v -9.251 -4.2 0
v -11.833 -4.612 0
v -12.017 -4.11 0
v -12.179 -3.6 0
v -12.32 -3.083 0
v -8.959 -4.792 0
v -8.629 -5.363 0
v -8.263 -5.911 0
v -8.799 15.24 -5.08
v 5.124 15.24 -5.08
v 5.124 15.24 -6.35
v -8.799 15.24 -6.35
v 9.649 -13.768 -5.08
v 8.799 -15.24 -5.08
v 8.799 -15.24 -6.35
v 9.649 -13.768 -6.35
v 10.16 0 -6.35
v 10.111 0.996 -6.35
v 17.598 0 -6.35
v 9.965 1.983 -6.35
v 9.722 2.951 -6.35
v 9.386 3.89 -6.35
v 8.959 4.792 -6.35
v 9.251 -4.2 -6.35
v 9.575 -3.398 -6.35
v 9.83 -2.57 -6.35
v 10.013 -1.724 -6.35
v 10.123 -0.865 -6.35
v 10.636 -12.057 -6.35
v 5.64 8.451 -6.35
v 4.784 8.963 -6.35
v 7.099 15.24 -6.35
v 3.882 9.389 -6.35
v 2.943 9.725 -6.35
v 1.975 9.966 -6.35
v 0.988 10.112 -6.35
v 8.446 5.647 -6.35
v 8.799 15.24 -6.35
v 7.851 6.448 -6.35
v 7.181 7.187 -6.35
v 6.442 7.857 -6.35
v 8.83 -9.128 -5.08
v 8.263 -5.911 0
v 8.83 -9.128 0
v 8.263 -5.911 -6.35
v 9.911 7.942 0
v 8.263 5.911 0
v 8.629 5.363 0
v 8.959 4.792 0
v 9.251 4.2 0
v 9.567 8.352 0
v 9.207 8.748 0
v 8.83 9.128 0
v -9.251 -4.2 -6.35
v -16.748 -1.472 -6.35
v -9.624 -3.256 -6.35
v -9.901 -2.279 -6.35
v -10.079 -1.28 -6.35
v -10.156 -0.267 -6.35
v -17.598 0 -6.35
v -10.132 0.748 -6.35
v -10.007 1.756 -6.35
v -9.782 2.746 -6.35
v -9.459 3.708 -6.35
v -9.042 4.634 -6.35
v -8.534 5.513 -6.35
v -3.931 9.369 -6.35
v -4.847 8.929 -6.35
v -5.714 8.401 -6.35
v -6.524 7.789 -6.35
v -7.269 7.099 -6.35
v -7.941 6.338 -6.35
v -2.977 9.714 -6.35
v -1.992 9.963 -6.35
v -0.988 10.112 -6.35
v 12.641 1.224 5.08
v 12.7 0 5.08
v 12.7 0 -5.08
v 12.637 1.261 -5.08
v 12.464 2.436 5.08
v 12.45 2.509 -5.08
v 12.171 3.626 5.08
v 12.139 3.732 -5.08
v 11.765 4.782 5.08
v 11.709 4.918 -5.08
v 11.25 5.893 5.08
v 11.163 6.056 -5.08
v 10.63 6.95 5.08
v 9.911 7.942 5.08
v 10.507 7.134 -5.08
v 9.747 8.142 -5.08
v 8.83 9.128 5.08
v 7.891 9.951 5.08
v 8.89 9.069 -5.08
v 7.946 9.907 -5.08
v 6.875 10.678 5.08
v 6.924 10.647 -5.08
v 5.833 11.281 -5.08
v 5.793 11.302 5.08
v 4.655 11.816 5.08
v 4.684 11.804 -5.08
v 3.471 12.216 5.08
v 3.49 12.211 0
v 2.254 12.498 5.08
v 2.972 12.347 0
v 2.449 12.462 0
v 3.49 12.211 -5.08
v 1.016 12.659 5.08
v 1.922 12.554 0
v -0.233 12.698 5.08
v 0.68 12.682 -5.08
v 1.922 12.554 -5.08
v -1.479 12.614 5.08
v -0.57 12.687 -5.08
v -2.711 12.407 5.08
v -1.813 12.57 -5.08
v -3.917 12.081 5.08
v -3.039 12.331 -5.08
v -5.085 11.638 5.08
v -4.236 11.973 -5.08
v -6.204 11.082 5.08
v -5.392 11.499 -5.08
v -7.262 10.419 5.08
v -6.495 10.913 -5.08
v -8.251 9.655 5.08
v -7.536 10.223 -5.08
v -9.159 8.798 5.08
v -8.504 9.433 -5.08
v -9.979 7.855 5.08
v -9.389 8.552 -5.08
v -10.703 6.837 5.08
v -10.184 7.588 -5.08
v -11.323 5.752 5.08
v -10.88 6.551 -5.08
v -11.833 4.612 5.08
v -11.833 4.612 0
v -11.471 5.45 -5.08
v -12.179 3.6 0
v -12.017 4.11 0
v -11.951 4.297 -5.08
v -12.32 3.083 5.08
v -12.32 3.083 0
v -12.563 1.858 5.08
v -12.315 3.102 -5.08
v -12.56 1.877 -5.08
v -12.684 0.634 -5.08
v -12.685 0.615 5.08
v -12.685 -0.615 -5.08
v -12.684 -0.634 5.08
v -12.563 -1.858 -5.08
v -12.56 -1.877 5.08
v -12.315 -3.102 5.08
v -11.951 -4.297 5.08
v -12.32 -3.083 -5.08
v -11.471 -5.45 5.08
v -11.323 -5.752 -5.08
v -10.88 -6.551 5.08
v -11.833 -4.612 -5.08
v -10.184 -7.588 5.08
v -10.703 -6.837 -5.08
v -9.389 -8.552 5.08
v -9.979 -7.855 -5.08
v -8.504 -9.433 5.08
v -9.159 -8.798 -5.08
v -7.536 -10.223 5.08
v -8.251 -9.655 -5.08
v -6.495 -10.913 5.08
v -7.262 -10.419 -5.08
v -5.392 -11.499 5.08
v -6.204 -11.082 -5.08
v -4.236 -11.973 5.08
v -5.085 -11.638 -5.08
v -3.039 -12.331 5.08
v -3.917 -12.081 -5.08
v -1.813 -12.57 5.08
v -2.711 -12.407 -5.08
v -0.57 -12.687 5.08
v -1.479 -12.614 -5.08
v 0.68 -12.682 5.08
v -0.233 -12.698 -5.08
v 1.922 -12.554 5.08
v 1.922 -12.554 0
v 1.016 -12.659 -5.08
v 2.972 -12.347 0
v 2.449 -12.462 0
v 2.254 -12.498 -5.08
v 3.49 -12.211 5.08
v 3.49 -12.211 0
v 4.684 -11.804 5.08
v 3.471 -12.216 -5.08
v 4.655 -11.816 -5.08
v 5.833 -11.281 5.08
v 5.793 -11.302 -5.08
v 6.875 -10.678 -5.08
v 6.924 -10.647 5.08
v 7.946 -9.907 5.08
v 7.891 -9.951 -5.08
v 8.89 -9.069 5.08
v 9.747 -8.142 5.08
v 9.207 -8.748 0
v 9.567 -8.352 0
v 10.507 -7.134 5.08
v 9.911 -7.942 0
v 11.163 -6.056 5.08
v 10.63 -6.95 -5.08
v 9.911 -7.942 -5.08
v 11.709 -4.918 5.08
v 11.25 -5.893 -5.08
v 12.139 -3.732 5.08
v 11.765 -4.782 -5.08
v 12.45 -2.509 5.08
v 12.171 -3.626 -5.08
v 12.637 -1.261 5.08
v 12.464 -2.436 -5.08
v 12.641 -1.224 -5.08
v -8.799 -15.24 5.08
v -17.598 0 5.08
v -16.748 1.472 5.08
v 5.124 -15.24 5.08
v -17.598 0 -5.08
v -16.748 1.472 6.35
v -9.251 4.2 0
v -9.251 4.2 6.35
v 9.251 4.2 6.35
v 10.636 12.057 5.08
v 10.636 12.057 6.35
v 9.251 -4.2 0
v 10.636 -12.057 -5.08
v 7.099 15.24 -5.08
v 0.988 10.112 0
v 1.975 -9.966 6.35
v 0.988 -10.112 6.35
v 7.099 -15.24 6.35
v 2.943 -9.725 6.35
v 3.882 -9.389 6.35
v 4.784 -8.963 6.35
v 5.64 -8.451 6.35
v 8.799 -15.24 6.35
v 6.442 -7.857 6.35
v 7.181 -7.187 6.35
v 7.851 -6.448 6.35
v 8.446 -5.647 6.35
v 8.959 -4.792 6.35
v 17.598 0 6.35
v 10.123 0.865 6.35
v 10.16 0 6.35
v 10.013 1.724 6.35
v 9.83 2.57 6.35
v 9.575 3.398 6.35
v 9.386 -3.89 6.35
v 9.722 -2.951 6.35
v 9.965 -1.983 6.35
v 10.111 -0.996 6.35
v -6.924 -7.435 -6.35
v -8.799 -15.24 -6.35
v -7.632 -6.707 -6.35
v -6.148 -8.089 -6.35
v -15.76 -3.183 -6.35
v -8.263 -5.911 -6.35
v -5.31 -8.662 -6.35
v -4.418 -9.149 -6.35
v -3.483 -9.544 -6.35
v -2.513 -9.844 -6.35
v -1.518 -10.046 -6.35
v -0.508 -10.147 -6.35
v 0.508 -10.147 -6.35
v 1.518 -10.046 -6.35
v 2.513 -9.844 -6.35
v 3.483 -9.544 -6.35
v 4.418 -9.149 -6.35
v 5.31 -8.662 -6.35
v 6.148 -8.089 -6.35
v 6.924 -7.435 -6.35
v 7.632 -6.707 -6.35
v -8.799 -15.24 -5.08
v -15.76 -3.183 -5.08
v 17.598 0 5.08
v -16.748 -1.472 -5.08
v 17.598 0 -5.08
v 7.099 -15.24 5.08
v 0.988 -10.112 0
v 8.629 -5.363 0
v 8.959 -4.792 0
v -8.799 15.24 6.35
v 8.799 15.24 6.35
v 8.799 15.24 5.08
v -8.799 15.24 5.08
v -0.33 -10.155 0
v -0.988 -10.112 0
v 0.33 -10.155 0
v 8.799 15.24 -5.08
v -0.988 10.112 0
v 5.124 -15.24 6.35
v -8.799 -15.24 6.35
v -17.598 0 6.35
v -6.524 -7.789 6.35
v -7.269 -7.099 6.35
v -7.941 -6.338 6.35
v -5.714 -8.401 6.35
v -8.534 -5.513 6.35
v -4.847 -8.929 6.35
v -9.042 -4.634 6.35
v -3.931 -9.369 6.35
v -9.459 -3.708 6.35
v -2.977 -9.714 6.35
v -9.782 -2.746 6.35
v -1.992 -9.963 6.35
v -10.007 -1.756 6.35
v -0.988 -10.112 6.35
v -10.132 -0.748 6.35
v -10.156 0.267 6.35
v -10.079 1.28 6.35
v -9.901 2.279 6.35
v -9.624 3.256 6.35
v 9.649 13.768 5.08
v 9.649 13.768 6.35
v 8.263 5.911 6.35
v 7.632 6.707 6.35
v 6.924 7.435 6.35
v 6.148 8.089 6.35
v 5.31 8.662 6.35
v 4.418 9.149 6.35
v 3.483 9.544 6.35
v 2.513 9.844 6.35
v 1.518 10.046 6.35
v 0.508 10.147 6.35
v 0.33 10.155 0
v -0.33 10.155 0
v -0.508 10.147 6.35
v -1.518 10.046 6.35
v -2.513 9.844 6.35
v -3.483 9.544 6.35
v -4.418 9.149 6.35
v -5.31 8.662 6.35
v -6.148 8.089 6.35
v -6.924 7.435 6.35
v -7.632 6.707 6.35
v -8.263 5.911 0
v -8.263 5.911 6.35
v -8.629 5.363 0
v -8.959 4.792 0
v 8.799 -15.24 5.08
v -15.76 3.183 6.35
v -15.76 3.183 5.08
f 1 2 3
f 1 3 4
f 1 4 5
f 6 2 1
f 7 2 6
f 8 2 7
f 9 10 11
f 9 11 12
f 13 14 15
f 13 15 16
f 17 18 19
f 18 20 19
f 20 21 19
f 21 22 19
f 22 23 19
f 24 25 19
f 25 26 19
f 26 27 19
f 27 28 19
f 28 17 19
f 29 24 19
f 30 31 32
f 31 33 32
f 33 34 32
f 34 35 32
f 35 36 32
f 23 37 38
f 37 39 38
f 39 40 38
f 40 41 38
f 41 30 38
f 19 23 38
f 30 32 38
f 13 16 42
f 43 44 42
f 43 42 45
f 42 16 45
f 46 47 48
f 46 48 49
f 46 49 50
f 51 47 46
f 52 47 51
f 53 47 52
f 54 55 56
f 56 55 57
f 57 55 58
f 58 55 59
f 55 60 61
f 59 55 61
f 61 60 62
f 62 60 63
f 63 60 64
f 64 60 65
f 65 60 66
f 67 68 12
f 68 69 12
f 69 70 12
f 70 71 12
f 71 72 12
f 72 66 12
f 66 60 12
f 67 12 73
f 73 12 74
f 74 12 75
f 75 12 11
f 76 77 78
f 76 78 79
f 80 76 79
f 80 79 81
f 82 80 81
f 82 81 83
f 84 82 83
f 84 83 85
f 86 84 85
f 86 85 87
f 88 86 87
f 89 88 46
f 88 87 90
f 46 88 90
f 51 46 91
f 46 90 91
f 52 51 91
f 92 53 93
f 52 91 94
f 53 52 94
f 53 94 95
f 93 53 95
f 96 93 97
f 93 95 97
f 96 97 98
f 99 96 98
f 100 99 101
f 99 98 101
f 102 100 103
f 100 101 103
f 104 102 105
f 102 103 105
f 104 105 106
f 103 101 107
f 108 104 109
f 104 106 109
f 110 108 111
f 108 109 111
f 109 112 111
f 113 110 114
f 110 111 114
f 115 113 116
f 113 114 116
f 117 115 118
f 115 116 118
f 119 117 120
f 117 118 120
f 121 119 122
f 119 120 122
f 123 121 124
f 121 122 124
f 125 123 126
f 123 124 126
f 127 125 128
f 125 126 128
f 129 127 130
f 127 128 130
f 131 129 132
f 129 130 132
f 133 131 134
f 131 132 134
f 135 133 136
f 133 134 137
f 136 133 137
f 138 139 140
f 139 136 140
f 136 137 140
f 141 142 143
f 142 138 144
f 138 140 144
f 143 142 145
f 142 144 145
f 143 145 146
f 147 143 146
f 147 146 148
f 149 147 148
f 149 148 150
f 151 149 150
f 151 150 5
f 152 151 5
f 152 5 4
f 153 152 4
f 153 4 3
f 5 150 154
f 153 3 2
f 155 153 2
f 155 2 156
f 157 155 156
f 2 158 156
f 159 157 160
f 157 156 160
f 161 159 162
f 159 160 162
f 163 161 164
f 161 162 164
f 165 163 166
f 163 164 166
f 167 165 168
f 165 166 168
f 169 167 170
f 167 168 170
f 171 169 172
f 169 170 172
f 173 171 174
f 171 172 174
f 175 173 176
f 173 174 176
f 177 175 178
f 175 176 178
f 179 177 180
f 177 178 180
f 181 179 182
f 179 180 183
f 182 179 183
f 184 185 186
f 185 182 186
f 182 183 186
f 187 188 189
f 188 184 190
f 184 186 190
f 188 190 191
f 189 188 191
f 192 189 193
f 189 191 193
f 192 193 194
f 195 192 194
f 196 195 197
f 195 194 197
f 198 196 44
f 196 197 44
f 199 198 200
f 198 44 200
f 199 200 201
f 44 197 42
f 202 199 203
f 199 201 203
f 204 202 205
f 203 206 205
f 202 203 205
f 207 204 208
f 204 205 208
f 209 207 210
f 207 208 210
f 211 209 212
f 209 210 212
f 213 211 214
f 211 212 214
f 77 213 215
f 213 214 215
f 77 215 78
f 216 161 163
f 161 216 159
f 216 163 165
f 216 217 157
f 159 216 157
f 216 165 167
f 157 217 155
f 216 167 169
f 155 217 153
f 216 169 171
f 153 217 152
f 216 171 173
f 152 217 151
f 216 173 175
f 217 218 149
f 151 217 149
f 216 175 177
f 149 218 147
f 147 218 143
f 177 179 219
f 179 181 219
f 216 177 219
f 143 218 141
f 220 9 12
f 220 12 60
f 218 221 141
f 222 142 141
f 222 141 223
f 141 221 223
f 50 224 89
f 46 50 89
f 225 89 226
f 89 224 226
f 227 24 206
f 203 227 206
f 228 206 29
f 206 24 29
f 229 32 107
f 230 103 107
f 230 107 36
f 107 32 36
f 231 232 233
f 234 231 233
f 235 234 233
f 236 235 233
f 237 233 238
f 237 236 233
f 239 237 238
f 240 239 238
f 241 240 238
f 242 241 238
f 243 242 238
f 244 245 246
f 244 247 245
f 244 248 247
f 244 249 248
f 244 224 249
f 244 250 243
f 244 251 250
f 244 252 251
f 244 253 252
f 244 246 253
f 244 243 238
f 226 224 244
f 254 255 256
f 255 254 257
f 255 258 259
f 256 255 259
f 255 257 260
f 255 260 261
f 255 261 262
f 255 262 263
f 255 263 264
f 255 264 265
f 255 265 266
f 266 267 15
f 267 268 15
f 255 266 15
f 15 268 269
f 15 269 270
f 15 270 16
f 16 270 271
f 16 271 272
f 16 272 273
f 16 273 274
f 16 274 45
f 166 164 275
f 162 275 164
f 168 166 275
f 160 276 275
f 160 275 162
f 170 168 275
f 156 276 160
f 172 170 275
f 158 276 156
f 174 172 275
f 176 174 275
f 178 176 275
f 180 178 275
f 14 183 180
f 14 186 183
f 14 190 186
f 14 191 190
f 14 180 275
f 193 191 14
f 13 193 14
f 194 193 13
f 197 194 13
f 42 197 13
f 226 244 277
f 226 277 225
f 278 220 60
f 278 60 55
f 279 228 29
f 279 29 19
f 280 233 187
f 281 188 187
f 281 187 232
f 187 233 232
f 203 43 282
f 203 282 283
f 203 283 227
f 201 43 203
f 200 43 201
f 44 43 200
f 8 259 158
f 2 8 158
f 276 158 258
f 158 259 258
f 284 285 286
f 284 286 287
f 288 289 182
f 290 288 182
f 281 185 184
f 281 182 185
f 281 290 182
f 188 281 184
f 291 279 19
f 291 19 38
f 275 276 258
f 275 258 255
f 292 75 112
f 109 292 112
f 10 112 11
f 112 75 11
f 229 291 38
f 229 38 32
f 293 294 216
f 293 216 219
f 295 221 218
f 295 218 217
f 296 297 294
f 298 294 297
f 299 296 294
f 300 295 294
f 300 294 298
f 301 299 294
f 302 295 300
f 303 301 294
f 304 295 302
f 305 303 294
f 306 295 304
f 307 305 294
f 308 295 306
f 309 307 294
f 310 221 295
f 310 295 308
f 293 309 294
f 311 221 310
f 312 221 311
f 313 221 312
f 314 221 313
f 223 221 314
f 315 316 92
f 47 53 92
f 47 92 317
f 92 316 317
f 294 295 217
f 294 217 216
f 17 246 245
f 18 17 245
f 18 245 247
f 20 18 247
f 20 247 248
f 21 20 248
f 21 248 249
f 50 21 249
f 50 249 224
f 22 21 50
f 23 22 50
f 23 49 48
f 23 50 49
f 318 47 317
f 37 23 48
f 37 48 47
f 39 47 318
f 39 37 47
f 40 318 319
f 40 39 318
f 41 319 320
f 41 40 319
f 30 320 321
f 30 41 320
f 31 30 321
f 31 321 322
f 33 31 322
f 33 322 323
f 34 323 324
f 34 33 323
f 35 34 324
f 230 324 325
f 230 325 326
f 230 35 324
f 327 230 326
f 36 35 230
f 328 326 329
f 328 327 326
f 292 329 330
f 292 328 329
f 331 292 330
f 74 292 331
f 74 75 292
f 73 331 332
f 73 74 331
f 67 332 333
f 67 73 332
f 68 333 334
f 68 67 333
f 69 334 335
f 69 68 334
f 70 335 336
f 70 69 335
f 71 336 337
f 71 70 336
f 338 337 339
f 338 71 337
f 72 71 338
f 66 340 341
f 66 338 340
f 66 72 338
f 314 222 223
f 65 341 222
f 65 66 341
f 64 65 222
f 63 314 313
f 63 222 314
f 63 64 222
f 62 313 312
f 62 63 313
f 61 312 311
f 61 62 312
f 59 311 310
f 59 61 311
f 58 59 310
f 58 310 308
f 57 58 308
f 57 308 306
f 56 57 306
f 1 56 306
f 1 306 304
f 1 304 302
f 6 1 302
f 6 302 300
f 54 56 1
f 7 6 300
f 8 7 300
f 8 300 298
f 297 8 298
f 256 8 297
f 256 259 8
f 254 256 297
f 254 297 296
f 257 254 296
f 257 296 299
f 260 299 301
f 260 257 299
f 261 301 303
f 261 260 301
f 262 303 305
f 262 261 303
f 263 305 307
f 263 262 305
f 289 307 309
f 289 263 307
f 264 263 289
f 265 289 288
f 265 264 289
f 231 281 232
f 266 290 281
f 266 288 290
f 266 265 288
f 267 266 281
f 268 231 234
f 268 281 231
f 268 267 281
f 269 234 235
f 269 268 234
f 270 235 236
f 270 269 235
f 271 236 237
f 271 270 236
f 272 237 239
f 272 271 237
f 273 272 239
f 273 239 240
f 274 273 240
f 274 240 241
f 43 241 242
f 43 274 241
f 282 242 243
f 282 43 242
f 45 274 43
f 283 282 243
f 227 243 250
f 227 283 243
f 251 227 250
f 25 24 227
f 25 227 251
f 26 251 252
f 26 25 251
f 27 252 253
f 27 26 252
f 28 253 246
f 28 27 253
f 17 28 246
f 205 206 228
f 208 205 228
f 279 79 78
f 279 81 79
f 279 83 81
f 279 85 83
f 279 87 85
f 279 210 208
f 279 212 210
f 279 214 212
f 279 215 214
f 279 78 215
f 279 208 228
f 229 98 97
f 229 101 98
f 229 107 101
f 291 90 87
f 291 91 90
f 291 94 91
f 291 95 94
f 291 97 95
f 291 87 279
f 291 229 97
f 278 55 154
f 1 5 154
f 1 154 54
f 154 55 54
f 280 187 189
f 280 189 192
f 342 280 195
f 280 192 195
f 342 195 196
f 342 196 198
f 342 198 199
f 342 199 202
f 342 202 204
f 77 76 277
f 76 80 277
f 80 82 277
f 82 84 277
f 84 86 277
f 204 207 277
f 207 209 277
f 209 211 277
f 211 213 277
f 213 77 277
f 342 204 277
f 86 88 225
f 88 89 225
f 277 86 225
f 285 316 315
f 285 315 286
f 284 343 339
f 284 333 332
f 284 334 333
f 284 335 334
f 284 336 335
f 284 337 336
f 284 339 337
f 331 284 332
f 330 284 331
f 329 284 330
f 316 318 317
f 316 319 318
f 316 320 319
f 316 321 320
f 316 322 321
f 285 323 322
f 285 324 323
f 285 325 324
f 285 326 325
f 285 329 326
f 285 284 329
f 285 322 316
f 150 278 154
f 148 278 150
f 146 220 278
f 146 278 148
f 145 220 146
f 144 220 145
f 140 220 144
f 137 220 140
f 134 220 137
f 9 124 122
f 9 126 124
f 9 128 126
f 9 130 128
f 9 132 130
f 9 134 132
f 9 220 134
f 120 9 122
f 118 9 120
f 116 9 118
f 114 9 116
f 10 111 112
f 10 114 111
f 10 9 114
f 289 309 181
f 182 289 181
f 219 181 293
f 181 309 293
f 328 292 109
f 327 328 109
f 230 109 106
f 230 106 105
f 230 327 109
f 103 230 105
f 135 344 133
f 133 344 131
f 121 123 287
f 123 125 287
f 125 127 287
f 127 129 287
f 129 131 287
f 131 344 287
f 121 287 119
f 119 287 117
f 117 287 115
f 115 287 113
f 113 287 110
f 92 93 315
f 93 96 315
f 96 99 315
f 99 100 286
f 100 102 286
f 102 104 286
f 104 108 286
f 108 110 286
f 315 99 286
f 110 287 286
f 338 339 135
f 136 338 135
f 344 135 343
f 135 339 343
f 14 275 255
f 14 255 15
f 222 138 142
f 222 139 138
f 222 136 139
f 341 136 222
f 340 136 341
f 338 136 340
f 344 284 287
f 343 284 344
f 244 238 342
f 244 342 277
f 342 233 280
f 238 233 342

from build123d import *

# Parameters (mm, degrees)
F0_R     = 12.7
F0_R_2   = 10.16
F1_DEPTH = 6.35
F2_R     = 17.5976362049
F2_R_2   = 12.7
F3_DEPTH = 5.08
F5_DEPTH = 6.35
F7_DEPTH = 6.35


with BuildPart() as f1:
    # F0 (on Top) → F1 (new body, symmetric)
    with BuildSketch(Plane.XY):
        Polygon((17.5976362049, 0), (8.7988181024, 15.24), (-8.7988181024, 15.24), (-17.5976362049, 0), (-8.7988181024, -15.24), (8.7988181024, -15.24), align=None)
        Circle(F0_R, mode=Mode.SUBTRACT)
        Circle(F0_R)
        Circle(F0_R_2, mode=Mode.SUBTRACT)
    extrude(amount=F1_DEPTH, both=True)

    # F2 (on Top) → F3 (cut, symmetric)
    with BuildSketch(Plane.XY):
        Circle(F2_R)
        Circle(F2_R_2, mode=Mode.SUBTRACT)
    extrude(amount=F3_DEPTH, both=True, mode=Mode.SUBTRACT)

    # F4 (on face) → F5 (cut)
    with BuildSketch(Plane.XY.offset(6.35)):
        with BuildLine():
            Line((-8.2631840954, 5.911462476), (-15.7600253185, 3.1828354198))
            Line((-15.7600253185, 3.1828354198), (-16.7479099485, 1.4717690485))
            Line((-16.7479099485, 1.4717690485), (-9.2510687255, 4.2003961048))
            ThreePointArc((-9.2510687255, 4.2003961048), (-8.7988181024, 5.08), (-8.2631840954, 5.911462476))
        make_face()
        with BuildLine():
            ThreePointArc((0.9878846301, -10.1118585808), (0, -10.16), (-0.9878846301, -10.1118585808))
            Line((-0.9878846301, -10.1118585808), (5.1235963296, -15.24))
            Line((5.1235963296, -15.24), (7.0993655897, -15.24))
            Line((7.0993655897, -15.24), (0.9878846301, -10.1118585808))
        make_face()
        with BuildLine():
            Line((9.6485443588, 13.7682309515), (8.2631840954, 5.911462476))
            ThreePointArc((8.2631840954, 5.911462476), (8.7988181024, 5.08), (9.2510687255, 4.2003961048))
            Line((9.2510687255, 4.2003961048), (10.6364289889, 12.0571645802))
            Line((10.6364289889, 12.0571645802), (9.6485443588, 13.7682309515))
        make_face()
    extrude(amount=-F5_DEPTH, mode=Mode.SUBTRACT)

    # F6 (on face) → F7 (cut)
    with BuildSketch(Plane(origin=(0, 0, -6.35), x_dir=(1, 0, 0), z_dir=(0, 0, -1))):
        with BuildLine():
            Line((9.6485443588, 13.7682309515), (8.2631840954, 5.911462476))
            ThreePointArc((8.2631840954, 5.911462476), (8.7988181024, 5.08), (9.2510687255, 4.2003961048))
            Line((9.2510687255, 4.2003961048), (10.6364289889, 12.0571645802))
            Line((10.6364289889, 12.0571645802), (9.6485443588, 13.7682309515))
        make_face()
        with BuildLine():
            Line((-8.2631840954, 5.911462476), (-15.7600253185, 3.1828354198))
            Line((-15.7600253185, 3.1828354198), (-16.7479099485, 1.4717690485))
            Line((-16.7479099485, 1.4717690485), (-9.2510687255, 4.2003961048))
            ThreePointArc((-9.2510687255, 4.2003961048), (-8.7988181024, 5.08), (-8.2631840954, 5.911462476))
        make_face()
        with BuildLine():
            ThreePointArc((0.9878846301, -10.1118585808), (0, -10.16), (-0.9878846301, -10.1118585808))
            Line((-0.9878846301, -10.1118585808), (5.1235963296, -15.24))
            Line((5.1235963296, -15.24), (7.0993655897, -15.24))
            Line((7.0993655897, -15.24), (0.9878846301, -10.1118585808))
        make_face()
    extrude(amount=-F7_DEPTH, mode=Mode.SUBTRACT)


solid = f1.part
